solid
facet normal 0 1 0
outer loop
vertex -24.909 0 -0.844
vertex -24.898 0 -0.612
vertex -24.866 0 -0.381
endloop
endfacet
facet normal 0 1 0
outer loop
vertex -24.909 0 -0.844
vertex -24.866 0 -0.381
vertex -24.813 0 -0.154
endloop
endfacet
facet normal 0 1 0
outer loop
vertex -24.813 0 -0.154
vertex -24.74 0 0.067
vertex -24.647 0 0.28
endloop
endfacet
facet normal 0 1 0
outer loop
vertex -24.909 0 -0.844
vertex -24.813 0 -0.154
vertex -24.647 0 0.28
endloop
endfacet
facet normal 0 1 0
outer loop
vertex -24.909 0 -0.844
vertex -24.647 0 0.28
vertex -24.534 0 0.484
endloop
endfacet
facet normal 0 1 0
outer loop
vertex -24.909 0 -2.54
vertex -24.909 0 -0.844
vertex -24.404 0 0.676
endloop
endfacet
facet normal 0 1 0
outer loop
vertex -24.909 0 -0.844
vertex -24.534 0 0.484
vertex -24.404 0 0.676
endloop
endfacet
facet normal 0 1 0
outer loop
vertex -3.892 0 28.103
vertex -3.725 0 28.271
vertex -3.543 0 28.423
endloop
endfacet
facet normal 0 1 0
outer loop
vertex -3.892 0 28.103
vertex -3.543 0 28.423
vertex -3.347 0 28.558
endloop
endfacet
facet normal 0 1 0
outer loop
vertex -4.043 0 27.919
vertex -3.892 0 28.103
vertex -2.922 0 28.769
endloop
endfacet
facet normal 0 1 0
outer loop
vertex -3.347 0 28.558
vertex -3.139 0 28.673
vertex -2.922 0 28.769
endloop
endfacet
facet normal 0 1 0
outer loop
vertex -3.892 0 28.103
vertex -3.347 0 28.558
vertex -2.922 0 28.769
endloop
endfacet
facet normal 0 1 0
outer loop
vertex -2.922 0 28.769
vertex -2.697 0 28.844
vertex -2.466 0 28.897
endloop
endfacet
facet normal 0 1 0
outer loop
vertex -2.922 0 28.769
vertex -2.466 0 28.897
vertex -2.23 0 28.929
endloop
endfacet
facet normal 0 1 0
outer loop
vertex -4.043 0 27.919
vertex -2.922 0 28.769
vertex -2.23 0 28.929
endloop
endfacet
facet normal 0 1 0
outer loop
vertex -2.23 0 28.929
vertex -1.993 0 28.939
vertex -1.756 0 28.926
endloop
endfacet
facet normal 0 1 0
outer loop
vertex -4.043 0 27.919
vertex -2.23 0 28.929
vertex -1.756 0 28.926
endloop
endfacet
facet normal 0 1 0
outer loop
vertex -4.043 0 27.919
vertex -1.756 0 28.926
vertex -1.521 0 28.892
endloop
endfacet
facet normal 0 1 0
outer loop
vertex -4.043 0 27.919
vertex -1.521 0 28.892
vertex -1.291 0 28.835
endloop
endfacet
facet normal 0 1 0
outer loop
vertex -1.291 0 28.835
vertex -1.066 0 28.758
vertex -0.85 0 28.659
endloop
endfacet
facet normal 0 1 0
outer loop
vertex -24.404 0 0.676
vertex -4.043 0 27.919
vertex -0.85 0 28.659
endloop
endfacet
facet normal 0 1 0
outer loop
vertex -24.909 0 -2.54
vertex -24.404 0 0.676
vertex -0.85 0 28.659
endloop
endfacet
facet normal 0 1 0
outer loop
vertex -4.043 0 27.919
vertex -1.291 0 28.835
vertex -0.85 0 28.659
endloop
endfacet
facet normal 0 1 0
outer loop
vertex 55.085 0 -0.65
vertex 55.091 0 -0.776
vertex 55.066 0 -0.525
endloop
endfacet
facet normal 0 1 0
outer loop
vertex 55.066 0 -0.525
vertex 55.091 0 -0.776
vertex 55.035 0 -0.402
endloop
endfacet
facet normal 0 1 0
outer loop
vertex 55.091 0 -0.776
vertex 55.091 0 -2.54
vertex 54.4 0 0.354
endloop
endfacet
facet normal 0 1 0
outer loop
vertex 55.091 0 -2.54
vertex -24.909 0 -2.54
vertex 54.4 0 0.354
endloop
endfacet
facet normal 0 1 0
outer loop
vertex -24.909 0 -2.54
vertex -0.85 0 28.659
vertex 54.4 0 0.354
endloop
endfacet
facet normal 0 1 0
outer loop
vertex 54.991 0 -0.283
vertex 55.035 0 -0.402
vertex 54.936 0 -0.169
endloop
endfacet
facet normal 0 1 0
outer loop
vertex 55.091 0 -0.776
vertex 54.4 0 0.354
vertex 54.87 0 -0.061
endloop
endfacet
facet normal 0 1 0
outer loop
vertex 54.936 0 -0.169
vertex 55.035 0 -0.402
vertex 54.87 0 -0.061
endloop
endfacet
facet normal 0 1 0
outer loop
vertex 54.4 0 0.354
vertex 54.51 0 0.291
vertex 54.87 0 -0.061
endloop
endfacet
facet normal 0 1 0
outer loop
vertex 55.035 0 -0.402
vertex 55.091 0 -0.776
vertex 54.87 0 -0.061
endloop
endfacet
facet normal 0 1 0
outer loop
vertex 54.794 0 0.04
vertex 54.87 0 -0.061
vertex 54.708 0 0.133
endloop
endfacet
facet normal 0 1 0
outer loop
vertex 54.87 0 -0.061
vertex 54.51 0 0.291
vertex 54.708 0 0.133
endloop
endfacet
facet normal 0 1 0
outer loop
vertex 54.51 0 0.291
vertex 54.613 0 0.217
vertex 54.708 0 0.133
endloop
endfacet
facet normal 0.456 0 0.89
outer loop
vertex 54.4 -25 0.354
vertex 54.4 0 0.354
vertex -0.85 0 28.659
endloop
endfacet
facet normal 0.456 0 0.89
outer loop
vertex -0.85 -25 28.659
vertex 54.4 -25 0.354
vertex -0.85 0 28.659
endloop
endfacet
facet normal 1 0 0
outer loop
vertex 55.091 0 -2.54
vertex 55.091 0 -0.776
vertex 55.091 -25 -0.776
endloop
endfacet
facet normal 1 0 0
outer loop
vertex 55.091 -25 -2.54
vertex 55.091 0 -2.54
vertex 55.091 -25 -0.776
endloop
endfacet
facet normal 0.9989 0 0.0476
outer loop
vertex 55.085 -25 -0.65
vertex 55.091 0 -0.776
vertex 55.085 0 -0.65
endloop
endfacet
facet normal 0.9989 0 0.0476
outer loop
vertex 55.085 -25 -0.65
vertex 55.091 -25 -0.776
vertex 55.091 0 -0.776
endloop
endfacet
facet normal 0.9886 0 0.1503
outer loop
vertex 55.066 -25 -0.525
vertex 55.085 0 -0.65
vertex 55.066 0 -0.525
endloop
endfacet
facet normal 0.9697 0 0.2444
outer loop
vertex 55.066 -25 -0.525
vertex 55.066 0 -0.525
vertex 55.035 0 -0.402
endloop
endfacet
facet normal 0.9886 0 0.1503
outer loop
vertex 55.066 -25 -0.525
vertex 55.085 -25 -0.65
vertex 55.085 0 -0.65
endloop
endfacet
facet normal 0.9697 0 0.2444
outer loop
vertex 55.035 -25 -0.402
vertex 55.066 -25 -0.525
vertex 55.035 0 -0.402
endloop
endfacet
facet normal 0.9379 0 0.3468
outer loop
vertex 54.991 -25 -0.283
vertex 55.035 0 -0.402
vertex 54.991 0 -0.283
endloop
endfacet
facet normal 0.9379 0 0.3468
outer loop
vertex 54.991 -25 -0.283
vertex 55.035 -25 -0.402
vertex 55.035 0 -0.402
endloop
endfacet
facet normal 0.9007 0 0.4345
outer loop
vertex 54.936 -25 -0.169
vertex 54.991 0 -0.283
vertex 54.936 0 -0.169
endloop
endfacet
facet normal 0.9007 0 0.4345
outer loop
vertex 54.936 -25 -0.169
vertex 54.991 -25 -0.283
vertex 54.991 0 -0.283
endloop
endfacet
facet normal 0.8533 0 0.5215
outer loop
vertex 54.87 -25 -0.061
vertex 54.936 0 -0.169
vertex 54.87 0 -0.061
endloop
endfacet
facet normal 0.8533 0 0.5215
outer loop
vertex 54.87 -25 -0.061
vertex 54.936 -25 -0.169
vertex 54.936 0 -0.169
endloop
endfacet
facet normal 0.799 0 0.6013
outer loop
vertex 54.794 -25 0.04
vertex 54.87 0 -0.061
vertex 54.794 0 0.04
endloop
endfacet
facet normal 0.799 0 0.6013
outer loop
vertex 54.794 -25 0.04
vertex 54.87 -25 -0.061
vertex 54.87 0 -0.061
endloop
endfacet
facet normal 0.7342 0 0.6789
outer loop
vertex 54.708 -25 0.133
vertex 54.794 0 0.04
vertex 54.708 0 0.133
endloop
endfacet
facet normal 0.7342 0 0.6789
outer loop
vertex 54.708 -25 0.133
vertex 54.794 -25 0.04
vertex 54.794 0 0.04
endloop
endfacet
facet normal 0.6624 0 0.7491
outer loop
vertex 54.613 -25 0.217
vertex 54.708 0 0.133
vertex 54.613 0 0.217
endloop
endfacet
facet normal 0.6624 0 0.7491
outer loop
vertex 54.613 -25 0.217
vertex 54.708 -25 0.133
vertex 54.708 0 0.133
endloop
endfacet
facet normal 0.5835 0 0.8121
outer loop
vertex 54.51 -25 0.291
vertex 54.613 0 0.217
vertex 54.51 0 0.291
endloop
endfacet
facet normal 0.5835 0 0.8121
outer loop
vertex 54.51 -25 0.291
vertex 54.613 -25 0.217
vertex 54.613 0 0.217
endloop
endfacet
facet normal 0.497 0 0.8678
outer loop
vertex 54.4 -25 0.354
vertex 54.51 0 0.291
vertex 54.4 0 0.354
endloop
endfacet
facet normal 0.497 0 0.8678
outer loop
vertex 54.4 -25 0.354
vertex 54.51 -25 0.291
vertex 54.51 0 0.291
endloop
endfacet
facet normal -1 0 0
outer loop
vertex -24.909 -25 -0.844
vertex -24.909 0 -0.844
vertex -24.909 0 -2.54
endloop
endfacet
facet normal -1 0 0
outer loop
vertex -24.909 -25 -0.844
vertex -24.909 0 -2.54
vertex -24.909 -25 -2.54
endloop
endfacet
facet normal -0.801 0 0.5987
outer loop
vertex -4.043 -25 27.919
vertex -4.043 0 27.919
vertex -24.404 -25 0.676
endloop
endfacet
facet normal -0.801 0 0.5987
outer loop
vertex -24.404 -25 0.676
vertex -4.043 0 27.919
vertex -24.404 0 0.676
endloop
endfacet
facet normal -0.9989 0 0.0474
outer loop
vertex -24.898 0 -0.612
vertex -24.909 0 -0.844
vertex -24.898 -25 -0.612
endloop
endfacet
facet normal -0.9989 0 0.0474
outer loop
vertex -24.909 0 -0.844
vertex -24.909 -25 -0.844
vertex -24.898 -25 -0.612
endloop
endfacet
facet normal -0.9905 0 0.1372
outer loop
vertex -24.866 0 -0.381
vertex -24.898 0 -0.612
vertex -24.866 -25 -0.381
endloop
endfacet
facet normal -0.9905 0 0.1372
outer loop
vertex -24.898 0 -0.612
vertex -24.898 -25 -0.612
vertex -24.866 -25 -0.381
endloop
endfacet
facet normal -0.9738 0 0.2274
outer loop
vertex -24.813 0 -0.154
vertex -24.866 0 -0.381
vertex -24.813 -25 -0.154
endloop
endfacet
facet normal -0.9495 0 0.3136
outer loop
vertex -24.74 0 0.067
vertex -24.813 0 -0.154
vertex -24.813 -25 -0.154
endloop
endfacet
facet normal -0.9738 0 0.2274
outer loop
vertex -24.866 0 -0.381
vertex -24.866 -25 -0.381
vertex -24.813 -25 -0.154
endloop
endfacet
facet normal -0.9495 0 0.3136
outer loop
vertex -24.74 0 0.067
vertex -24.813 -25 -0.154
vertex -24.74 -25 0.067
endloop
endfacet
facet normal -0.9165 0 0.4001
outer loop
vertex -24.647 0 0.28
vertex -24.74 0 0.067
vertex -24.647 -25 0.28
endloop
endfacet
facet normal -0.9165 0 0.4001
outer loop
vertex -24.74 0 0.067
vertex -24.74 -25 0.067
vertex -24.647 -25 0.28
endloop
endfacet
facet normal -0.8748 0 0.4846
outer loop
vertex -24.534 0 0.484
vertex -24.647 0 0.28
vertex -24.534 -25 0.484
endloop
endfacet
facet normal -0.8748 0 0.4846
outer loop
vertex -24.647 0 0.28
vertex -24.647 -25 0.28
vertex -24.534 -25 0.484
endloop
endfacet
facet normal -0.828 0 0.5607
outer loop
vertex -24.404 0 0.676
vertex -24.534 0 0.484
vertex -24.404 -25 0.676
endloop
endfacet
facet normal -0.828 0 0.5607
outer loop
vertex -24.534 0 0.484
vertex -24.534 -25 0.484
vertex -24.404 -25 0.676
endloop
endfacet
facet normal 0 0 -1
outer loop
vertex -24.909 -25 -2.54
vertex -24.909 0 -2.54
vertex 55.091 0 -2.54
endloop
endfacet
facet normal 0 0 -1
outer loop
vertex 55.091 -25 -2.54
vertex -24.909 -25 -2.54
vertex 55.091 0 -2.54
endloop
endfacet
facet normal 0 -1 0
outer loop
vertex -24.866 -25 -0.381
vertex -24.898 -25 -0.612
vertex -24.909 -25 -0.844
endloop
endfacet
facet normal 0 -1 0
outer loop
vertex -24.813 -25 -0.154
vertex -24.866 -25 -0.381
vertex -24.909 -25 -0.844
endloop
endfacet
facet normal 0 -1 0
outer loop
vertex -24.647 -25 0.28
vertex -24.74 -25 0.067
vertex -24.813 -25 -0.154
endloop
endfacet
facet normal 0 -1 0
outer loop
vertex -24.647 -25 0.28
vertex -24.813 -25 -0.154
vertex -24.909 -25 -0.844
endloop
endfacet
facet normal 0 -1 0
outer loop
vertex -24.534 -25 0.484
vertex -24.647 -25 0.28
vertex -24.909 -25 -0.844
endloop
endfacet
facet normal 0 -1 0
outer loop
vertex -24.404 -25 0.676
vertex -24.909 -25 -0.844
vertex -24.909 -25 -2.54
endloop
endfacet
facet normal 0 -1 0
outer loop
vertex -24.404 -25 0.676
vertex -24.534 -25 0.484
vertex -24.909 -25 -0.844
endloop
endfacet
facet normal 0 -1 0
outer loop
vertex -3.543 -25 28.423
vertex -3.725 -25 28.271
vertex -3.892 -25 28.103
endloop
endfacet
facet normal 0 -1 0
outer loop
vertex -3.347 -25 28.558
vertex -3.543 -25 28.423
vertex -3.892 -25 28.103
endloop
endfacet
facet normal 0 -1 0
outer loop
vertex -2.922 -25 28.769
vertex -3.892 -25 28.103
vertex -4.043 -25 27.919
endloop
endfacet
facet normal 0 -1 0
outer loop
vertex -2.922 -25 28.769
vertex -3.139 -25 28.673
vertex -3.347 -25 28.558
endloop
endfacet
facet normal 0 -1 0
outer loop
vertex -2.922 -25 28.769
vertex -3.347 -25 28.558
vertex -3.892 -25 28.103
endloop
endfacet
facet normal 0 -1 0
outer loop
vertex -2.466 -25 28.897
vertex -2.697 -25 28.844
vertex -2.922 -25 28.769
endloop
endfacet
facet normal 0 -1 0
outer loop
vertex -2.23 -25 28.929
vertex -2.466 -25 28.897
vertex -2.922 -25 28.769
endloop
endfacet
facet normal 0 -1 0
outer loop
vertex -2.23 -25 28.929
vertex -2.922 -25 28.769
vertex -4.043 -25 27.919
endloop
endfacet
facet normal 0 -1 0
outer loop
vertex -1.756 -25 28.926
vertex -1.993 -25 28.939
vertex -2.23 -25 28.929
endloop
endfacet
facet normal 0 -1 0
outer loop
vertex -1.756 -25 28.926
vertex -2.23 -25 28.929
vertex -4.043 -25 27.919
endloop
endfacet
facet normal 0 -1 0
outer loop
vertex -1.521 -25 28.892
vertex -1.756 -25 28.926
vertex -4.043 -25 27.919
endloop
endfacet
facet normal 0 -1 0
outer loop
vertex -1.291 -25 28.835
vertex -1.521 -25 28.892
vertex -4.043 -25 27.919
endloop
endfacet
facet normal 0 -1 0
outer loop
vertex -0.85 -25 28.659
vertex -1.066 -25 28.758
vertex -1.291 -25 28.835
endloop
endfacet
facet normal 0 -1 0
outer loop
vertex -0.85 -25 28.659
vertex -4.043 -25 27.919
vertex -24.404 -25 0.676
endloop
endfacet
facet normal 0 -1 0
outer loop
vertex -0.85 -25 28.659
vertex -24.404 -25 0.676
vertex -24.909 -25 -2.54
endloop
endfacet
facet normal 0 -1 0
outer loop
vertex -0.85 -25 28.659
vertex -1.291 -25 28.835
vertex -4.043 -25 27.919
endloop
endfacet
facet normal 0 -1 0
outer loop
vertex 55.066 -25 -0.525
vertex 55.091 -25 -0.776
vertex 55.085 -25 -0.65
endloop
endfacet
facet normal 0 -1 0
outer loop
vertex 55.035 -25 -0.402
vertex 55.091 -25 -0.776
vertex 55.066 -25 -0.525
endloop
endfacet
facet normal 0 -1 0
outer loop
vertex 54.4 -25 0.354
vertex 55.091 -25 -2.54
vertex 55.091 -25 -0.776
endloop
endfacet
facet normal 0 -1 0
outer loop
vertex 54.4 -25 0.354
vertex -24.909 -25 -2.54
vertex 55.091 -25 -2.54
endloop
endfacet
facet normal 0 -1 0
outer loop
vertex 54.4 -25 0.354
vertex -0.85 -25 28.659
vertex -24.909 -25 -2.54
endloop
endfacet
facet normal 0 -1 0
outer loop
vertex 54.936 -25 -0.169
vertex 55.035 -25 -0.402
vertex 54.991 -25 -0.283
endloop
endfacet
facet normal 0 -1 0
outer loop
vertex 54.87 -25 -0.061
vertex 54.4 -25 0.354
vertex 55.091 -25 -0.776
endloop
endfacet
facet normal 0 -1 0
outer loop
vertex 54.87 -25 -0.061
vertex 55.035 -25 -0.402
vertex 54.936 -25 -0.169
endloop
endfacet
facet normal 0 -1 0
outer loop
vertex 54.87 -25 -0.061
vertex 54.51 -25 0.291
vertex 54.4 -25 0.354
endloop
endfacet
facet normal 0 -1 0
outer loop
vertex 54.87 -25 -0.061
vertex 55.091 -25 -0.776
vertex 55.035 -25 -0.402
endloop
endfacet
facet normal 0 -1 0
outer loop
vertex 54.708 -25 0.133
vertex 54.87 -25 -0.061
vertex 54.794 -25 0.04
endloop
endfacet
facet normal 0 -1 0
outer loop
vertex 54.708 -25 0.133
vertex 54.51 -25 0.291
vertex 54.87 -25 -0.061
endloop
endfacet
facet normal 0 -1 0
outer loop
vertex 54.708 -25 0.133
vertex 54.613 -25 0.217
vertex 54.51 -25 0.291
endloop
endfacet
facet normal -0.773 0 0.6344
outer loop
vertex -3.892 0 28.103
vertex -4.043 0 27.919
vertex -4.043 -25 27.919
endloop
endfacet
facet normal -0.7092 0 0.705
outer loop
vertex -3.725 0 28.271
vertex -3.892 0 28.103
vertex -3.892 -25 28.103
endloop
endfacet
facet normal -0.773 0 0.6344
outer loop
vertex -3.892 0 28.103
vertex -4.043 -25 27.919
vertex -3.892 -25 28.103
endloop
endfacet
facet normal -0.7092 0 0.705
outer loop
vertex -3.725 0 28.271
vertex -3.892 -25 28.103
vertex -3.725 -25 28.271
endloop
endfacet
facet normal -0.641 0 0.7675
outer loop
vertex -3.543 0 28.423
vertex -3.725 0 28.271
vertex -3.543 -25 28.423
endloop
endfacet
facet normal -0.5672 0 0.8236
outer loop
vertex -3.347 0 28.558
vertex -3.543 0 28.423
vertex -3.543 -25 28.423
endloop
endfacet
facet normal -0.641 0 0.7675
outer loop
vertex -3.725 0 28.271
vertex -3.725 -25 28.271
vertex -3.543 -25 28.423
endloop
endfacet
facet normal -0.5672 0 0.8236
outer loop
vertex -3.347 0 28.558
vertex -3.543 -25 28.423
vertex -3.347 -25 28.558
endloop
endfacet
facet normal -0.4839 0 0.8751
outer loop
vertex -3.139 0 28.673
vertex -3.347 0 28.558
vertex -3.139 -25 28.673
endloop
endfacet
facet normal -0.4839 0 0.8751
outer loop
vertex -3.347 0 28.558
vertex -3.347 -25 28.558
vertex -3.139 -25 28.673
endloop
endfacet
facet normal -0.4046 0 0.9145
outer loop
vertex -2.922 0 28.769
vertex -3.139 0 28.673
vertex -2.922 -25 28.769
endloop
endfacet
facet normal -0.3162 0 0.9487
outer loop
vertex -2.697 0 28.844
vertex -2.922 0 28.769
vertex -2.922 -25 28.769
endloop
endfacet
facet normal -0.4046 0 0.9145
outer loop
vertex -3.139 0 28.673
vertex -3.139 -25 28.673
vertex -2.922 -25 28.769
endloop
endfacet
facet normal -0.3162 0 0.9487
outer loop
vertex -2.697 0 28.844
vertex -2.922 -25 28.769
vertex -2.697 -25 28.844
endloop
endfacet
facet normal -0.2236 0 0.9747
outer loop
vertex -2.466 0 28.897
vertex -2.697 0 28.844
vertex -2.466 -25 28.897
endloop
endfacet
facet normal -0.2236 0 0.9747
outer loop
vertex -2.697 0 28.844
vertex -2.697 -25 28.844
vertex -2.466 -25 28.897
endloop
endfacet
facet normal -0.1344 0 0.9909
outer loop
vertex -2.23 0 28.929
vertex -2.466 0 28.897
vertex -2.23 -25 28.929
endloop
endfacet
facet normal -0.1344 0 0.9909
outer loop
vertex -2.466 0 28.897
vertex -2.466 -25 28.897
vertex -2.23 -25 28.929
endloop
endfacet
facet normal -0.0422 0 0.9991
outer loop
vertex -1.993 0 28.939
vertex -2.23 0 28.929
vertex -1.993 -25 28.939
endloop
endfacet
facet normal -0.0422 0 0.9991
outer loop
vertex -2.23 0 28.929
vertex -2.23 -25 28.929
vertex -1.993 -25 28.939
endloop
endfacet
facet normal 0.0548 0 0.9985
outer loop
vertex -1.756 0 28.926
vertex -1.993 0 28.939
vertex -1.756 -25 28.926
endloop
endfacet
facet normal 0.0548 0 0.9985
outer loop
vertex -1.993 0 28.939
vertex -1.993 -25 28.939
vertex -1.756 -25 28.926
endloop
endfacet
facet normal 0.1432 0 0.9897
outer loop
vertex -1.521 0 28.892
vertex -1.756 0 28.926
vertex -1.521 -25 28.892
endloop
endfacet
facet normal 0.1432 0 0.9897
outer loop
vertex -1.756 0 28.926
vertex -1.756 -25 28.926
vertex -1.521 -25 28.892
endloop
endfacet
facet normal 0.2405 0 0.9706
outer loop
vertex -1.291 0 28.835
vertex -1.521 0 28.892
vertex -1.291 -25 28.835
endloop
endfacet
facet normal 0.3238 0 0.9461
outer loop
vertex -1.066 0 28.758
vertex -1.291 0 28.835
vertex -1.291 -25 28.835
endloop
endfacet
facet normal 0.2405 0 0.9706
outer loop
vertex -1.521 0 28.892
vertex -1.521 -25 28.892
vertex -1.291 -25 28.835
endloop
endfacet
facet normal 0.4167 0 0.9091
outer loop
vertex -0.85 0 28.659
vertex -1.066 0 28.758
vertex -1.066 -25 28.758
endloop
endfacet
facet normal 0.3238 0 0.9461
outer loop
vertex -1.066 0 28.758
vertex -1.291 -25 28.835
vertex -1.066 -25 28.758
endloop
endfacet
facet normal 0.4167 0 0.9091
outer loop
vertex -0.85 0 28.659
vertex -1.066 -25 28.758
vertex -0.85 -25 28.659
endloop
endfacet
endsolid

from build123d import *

# Parameters (mm, degrees)
F1_DEPTH = 25.0000008
F2_R     = 2.54
F3_DEPTH = 2.54
F4_R     = 2.54
F5_R     = 1.27


with BuildPart() as f1:
    # F0 (on Front) → F1 (new body)
    with BuildSketch(Plane.XZ):
        Polygon((-2.759046882, 29.6373917907), (-24.9089798809, 0), (55.0911141191, 0), align=None)
    extrude(amount=F1_DEPTH)

    # F2
    f2_edges = [f1.edges().sort_by_distance(p)[0] for p in [
        (-2.759047, -12.5, 29.637392),
    ]]
    fillet(f2_edges, radius=F2_R)

    # F3 (add): a face of the model
    f3_faces = [f1.faces().sort_by_distance(p)[0] for p in [
        (15.0910671191, -12.5000004, 0),
    ]]
    extrude(f3_faces, amount=F3_DEPTH)

    # F4
    f4_edges = [f1.edges().sort_by_distance(p)[0] for p in [
        (-24.90898, -12.5, 0),
    ]]
    fillet(f4_edges, radius=F4_R)

    # F5
    f5_edges = [f1.edges().sort_by_distance(p)[0] for p in [
        (55.091114, -12.5, 0),
    ]]
    fillet(f5_edges, radius=F5_R)


solid = f1.part
